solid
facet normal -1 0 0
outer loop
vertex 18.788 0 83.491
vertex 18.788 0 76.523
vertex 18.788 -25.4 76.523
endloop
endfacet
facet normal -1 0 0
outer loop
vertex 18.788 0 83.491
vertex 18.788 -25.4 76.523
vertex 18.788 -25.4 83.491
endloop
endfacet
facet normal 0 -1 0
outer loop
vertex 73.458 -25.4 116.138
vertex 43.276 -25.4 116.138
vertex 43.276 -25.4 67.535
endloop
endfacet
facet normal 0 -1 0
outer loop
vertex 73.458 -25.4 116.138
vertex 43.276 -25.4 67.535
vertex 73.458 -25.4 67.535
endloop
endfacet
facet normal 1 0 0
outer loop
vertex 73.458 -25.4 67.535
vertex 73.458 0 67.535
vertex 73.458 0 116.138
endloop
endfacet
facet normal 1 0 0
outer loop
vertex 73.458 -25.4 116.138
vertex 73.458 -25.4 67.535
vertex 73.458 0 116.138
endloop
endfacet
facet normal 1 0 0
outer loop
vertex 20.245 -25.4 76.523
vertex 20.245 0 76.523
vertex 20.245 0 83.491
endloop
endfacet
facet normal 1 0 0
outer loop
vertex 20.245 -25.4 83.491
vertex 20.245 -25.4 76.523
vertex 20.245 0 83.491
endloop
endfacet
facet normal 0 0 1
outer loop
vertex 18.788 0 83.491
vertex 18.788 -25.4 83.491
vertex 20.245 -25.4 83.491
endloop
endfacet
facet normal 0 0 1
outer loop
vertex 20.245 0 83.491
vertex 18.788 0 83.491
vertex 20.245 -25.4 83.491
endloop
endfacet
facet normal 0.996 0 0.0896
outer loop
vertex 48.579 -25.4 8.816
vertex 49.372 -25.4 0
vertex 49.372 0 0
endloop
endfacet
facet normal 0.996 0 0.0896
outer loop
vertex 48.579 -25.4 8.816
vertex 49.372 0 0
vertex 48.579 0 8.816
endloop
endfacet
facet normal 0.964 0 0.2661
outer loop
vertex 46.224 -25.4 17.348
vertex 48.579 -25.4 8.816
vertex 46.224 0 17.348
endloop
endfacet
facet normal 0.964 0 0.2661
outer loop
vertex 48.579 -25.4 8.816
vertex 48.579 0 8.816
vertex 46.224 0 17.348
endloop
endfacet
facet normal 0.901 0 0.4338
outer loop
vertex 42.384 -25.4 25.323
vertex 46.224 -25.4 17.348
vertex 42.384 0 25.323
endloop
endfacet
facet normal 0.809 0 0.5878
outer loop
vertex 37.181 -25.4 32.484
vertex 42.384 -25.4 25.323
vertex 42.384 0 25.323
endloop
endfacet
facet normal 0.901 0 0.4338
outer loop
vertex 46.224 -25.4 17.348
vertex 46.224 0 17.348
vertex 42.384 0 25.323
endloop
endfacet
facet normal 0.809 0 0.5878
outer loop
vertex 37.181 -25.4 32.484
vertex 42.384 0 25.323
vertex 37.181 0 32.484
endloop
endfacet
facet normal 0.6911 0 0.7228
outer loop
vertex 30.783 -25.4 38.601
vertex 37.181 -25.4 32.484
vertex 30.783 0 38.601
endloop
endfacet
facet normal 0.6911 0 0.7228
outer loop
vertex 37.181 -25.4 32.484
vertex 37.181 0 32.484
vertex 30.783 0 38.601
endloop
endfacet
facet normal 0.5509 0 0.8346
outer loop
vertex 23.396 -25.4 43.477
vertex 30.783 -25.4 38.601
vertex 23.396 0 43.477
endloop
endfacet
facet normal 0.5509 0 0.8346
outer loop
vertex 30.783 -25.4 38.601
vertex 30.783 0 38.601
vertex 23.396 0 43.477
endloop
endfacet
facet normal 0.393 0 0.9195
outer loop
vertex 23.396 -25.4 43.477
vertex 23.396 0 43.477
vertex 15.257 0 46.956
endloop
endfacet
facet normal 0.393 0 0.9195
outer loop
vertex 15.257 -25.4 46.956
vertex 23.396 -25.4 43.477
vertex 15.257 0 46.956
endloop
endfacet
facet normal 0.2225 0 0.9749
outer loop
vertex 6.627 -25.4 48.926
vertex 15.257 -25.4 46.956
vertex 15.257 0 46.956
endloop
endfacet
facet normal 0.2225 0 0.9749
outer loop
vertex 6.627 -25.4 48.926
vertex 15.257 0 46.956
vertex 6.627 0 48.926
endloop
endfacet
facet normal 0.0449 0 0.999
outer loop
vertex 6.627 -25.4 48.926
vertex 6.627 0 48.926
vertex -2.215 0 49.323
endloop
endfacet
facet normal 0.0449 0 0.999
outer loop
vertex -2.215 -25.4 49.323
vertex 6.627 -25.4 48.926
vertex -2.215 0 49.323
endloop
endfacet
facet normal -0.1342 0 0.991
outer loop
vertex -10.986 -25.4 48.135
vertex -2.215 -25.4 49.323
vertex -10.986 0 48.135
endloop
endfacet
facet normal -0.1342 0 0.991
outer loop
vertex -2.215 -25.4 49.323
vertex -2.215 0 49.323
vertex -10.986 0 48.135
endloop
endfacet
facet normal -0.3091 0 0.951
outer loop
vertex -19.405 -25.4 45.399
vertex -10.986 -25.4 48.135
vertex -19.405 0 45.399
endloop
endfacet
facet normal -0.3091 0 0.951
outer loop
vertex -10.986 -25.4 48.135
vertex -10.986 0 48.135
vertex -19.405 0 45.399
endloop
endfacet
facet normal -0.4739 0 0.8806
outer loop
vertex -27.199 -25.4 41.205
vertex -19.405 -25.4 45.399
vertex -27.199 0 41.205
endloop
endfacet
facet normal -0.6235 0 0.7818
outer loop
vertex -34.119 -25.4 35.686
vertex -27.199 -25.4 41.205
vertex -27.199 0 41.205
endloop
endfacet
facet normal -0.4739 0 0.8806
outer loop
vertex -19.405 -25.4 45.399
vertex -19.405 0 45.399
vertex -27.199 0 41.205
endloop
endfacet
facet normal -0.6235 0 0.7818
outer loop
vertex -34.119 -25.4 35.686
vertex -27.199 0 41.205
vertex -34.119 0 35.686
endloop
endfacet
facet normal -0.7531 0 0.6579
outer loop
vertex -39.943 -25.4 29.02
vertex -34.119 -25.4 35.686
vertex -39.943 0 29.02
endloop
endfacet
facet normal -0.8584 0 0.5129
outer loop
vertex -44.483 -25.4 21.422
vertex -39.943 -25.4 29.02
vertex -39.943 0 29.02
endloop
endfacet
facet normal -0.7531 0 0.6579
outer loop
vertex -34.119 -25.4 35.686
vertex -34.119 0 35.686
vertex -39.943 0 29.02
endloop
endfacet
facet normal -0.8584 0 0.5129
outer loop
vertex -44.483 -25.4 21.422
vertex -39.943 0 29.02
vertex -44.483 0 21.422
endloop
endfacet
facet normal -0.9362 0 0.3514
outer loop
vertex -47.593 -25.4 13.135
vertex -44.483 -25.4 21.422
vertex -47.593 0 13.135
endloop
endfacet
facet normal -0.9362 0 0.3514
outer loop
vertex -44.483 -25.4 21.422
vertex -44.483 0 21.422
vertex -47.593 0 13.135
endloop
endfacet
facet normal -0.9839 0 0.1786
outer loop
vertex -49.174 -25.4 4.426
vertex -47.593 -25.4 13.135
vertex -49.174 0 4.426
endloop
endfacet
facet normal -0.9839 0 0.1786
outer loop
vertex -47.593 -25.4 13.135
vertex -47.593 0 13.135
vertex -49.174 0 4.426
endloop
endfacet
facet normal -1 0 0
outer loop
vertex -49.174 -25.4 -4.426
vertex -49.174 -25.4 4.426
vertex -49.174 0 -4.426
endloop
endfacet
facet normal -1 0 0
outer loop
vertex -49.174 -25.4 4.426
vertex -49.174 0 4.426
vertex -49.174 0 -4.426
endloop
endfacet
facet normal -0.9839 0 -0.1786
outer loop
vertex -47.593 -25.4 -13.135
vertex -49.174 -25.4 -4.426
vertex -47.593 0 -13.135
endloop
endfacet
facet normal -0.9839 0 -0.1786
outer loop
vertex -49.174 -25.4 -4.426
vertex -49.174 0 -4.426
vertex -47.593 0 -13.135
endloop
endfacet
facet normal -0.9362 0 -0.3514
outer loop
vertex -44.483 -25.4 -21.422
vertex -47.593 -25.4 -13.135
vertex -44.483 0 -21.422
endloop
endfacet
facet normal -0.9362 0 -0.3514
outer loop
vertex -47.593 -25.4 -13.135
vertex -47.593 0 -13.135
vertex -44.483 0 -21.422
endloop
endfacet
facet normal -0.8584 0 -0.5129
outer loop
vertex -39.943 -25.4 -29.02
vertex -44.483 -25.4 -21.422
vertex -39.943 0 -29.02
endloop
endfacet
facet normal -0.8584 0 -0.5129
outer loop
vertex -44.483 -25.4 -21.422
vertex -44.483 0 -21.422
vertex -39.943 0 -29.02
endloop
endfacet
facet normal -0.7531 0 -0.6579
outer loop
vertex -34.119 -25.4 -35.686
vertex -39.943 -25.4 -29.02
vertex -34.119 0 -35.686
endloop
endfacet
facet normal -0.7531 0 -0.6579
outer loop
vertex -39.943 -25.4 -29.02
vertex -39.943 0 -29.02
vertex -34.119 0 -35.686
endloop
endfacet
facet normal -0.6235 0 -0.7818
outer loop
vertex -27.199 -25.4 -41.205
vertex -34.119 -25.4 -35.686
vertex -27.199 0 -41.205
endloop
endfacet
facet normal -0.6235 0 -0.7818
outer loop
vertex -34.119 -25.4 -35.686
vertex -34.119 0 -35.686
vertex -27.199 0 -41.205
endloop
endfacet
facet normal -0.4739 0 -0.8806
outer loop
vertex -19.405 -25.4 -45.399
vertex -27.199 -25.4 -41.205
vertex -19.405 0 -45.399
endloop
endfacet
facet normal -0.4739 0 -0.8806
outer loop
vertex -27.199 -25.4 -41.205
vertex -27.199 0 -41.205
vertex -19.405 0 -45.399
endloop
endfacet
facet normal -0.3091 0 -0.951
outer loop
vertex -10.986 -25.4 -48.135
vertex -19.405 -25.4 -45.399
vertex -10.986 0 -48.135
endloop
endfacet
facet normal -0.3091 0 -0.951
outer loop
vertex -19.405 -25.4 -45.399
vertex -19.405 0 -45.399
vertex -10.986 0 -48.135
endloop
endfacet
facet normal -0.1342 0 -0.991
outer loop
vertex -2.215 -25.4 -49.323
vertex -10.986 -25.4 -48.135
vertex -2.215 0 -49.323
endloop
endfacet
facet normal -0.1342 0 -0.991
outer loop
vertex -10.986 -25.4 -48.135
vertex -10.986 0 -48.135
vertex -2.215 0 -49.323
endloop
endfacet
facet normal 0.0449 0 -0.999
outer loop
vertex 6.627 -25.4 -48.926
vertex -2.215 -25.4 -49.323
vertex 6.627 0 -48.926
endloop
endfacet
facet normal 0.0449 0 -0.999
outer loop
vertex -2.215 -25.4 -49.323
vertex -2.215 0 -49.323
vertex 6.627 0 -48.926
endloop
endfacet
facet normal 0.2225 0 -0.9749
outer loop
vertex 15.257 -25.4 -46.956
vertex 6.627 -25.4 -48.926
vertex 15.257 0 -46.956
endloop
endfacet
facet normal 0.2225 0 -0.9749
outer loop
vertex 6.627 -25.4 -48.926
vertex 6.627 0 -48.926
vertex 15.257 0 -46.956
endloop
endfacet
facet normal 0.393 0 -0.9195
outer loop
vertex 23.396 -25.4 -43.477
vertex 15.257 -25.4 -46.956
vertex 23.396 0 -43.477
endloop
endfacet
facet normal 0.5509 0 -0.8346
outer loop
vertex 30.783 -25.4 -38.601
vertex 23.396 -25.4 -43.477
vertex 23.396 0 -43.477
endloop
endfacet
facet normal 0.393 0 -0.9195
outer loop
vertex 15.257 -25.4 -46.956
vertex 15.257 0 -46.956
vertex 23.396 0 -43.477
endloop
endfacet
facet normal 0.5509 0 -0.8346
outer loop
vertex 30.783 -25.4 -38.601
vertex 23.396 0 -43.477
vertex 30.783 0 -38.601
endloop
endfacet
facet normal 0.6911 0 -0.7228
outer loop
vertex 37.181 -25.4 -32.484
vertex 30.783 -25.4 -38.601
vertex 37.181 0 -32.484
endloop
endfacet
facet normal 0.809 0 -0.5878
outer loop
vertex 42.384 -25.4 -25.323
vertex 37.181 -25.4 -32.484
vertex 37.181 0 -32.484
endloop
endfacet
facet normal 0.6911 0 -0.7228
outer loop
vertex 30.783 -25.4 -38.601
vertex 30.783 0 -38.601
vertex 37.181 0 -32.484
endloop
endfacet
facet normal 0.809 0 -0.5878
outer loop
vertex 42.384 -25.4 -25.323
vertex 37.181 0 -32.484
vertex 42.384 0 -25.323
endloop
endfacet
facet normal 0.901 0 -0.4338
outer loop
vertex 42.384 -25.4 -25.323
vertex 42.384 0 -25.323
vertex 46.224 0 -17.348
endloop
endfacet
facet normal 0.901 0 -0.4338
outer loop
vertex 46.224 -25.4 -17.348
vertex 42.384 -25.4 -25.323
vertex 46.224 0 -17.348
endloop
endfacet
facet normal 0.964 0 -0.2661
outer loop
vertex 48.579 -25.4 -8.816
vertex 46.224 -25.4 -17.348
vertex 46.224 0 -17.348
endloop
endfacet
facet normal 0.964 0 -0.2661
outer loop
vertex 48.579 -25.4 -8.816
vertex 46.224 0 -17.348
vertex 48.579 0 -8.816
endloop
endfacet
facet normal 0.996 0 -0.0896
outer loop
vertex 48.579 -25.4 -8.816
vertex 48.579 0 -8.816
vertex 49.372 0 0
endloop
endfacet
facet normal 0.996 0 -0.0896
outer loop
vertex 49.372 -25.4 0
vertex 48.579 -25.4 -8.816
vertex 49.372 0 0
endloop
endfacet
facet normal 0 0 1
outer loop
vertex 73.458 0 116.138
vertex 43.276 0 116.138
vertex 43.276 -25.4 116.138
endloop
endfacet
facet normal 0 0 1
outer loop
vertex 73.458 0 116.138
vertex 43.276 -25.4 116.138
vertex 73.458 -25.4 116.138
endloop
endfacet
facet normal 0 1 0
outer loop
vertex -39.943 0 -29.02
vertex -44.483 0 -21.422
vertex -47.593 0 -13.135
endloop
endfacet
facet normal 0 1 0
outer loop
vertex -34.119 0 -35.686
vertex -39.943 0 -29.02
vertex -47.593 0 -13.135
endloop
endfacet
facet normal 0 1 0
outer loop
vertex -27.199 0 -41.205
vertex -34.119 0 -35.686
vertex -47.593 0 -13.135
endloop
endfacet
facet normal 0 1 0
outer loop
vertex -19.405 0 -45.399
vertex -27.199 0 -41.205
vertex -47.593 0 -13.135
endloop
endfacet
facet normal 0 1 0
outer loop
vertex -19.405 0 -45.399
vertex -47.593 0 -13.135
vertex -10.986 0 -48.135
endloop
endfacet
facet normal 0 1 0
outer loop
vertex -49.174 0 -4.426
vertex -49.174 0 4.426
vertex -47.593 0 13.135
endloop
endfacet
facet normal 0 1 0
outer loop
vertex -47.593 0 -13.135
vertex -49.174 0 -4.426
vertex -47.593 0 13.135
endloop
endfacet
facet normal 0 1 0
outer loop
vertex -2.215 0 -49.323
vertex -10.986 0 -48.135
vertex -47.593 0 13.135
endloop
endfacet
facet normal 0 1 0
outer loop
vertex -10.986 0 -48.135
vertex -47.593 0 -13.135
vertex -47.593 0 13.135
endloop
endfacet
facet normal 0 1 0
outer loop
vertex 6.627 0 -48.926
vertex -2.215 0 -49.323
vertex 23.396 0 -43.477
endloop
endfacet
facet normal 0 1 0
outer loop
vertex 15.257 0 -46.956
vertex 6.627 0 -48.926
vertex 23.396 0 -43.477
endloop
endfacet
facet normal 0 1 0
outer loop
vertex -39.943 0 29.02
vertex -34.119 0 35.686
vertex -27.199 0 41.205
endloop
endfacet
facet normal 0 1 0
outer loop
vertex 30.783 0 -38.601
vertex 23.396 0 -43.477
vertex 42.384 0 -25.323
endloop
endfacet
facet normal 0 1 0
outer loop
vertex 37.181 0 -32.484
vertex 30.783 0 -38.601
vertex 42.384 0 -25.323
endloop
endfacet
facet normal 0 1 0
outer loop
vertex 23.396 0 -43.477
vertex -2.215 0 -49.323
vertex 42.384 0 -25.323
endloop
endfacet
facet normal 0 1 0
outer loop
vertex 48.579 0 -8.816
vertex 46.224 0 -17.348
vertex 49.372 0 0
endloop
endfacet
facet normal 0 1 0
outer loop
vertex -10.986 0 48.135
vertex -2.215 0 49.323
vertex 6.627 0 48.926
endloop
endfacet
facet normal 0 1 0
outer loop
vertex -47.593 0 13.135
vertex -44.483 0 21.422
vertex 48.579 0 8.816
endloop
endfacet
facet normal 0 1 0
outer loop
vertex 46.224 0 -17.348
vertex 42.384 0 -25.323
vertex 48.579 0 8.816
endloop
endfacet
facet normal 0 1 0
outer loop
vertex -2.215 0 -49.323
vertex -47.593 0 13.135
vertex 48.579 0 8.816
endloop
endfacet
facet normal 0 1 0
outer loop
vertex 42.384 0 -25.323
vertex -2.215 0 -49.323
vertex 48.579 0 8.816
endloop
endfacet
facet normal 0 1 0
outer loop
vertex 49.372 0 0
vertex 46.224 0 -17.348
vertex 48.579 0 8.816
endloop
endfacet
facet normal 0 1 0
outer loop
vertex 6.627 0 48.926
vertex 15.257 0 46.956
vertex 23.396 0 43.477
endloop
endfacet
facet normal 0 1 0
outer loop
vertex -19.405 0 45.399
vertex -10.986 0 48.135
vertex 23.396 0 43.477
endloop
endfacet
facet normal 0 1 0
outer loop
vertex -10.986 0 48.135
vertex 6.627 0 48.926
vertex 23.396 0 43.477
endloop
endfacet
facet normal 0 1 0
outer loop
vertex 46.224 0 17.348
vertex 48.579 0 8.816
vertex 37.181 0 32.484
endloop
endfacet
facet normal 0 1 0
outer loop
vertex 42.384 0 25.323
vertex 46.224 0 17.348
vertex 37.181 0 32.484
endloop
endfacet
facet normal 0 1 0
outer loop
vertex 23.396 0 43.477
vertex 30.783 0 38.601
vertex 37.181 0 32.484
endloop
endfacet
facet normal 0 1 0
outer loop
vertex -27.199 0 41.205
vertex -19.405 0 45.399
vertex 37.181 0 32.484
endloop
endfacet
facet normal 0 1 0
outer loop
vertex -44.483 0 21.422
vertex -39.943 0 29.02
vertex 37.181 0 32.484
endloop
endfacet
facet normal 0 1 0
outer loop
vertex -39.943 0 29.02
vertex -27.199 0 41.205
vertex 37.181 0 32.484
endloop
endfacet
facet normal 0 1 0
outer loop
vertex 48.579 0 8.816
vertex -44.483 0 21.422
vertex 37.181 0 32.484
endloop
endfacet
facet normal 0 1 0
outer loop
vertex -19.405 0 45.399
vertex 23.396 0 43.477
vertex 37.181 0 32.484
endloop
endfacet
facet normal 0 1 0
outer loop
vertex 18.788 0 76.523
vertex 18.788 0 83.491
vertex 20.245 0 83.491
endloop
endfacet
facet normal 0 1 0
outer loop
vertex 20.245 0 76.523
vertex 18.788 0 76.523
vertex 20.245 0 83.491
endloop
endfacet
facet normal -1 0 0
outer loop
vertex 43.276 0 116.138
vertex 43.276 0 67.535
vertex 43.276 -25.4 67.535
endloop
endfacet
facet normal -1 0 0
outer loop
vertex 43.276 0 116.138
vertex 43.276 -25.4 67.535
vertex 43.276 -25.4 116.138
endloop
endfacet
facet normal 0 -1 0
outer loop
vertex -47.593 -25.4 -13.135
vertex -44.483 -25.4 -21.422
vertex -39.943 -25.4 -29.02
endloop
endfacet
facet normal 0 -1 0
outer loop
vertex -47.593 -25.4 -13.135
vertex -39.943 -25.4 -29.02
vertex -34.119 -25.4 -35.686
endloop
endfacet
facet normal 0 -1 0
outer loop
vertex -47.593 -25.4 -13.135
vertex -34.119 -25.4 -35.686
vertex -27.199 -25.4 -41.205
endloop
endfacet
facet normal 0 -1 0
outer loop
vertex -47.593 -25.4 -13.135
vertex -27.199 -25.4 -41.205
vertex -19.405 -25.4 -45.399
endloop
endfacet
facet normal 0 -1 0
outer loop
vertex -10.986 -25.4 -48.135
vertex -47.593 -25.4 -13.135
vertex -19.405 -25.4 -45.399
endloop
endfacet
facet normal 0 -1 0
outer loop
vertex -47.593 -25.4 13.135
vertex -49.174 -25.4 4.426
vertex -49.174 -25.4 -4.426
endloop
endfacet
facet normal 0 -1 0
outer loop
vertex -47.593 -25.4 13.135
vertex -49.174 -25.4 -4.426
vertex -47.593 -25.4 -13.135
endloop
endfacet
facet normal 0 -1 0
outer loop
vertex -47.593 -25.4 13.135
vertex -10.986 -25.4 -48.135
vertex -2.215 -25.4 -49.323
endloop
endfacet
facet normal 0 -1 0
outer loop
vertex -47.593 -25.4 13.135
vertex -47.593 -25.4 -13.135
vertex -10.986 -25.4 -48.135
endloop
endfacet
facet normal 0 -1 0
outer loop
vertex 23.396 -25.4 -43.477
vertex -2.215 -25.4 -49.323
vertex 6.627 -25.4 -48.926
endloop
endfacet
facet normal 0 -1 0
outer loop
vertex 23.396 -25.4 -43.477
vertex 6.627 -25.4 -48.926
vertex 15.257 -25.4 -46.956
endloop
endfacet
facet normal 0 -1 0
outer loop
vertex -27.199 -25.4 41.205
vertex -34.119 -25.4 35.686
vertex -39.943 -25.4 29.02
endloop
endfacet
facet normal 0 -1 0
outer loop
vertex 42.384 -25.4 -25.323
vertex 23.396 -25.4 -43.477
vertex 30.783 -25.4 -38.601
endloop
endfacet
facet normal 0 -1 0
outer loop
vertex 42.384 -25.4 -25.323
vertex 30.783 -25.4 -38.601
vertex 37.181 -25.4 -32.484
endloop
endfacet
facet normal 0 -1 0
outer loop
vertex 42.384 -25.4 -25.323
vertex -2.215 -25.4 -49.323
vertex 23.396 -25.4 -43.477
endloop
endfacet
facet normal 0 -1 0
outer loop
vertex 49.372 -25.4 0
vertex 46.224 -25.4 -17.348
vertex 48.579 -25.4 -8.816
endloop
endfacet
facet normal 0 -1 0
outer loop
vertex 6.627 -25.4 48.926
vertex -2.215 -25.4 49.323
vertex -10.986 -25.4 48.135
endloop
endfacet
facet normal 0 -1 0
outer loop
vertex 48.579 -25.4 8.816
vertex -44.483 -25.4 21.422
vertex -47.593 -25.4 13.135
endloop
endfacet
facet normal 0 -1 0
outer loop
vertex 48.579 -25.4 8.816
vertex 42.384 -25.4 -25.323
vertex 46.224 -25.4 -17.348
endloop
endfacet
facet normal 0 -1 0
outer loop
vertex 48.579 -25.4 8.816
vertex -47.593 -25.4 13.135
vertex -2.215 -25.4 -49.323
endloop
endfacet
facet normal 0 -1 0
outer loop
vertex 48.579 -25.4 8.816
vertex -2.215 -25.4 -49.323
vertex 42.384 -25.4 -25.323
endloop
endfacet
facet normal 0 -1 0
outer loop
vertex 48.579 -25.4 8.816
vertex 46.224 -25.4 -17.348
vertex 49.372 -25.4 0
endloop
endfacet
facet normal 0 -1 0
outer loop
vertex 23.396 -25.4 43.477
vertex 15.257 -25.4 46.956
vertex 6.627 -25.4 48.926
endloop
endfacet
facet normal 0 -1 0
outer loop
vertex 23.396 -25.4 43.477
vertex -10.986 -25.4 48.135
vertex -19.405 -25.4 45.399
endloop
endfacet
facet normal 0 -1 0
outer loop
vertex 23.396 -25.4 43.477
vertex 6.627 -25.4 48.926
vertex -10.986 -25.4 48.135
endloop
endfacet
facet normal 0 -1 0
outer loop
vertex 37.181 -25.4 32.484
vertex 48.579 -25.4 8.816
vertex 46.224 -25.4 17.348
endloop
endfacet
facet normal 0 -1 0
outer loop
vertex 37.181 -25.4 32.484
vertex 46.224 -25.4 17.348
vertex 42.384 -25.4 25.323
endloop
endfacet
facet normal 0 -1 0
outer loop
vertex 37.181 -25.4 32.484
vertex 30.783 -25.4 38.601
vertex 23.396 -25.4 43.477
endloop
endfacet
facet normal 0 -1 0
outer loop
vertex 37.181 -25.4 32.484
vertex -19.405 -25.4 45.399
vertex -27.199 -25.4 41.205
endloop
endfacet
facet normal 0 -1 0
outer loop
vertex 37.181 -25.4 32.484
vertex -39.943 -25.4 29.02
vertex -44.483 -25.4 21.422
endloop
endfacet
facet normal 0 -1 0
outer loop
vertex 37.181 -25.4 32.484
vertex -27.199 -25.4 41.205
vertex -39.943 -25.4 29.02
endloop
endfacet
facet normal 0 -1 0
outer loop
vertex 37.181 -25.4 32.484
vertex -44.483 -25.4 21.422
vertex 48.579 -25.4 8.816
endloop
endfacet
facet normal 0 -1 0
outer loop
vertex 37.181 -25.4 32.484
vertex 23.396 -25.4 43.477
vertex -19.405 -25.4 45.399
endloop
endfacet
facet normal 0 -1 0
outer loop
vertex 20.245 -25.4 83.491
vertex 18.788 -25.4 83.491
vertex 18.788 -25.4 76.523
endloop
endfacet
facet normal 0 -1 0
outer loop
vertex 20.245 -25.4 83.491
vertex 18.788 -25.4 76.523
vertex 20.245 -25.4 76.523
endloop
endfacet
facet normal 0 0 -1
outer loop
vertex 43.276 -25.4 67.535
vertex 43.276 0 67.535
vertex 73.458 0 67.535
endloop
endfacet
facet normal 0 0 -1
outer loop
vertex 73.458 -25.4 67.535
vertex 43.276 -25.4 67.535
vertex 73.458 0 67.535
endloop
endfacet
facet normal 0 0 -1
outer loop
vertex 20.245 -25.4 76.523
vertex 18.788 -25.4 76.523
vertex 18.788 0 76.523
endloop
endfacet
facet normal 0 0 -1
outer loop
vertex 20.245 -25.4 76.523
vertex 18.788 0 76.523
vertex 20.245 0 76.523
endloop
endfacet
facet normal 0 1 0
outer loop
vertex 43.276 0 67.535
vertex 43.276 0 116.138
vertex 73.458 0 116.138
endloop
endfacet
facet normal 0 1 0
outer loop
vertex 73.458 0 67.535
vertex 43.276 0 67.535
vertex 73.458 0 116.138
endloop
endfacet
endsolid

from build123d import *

# Parameters (mm, degrees)
F1_W     = 1.456469
F1_H     = 6.968319
F1_W_2   = 30.181892
F1_H_2   = 48.602842
F1_R     = 49.372417
F2_DEPTH = 25.4


with BuildPart() as f2:
    # F1 (on face) → F2 (new body)
    with BuildSketch(Plane.XZ):
        with Locations((19.516655, 80.006719)):
            Rectangle(F1_W, F1_H)
        with Locations((58.367323, 91.836769)):
            Rectangle(F1_W_2, F1_H_2)
        Circle(F1_R)
    extrude(amount=F2_DEPTH)


solid = f2.part
